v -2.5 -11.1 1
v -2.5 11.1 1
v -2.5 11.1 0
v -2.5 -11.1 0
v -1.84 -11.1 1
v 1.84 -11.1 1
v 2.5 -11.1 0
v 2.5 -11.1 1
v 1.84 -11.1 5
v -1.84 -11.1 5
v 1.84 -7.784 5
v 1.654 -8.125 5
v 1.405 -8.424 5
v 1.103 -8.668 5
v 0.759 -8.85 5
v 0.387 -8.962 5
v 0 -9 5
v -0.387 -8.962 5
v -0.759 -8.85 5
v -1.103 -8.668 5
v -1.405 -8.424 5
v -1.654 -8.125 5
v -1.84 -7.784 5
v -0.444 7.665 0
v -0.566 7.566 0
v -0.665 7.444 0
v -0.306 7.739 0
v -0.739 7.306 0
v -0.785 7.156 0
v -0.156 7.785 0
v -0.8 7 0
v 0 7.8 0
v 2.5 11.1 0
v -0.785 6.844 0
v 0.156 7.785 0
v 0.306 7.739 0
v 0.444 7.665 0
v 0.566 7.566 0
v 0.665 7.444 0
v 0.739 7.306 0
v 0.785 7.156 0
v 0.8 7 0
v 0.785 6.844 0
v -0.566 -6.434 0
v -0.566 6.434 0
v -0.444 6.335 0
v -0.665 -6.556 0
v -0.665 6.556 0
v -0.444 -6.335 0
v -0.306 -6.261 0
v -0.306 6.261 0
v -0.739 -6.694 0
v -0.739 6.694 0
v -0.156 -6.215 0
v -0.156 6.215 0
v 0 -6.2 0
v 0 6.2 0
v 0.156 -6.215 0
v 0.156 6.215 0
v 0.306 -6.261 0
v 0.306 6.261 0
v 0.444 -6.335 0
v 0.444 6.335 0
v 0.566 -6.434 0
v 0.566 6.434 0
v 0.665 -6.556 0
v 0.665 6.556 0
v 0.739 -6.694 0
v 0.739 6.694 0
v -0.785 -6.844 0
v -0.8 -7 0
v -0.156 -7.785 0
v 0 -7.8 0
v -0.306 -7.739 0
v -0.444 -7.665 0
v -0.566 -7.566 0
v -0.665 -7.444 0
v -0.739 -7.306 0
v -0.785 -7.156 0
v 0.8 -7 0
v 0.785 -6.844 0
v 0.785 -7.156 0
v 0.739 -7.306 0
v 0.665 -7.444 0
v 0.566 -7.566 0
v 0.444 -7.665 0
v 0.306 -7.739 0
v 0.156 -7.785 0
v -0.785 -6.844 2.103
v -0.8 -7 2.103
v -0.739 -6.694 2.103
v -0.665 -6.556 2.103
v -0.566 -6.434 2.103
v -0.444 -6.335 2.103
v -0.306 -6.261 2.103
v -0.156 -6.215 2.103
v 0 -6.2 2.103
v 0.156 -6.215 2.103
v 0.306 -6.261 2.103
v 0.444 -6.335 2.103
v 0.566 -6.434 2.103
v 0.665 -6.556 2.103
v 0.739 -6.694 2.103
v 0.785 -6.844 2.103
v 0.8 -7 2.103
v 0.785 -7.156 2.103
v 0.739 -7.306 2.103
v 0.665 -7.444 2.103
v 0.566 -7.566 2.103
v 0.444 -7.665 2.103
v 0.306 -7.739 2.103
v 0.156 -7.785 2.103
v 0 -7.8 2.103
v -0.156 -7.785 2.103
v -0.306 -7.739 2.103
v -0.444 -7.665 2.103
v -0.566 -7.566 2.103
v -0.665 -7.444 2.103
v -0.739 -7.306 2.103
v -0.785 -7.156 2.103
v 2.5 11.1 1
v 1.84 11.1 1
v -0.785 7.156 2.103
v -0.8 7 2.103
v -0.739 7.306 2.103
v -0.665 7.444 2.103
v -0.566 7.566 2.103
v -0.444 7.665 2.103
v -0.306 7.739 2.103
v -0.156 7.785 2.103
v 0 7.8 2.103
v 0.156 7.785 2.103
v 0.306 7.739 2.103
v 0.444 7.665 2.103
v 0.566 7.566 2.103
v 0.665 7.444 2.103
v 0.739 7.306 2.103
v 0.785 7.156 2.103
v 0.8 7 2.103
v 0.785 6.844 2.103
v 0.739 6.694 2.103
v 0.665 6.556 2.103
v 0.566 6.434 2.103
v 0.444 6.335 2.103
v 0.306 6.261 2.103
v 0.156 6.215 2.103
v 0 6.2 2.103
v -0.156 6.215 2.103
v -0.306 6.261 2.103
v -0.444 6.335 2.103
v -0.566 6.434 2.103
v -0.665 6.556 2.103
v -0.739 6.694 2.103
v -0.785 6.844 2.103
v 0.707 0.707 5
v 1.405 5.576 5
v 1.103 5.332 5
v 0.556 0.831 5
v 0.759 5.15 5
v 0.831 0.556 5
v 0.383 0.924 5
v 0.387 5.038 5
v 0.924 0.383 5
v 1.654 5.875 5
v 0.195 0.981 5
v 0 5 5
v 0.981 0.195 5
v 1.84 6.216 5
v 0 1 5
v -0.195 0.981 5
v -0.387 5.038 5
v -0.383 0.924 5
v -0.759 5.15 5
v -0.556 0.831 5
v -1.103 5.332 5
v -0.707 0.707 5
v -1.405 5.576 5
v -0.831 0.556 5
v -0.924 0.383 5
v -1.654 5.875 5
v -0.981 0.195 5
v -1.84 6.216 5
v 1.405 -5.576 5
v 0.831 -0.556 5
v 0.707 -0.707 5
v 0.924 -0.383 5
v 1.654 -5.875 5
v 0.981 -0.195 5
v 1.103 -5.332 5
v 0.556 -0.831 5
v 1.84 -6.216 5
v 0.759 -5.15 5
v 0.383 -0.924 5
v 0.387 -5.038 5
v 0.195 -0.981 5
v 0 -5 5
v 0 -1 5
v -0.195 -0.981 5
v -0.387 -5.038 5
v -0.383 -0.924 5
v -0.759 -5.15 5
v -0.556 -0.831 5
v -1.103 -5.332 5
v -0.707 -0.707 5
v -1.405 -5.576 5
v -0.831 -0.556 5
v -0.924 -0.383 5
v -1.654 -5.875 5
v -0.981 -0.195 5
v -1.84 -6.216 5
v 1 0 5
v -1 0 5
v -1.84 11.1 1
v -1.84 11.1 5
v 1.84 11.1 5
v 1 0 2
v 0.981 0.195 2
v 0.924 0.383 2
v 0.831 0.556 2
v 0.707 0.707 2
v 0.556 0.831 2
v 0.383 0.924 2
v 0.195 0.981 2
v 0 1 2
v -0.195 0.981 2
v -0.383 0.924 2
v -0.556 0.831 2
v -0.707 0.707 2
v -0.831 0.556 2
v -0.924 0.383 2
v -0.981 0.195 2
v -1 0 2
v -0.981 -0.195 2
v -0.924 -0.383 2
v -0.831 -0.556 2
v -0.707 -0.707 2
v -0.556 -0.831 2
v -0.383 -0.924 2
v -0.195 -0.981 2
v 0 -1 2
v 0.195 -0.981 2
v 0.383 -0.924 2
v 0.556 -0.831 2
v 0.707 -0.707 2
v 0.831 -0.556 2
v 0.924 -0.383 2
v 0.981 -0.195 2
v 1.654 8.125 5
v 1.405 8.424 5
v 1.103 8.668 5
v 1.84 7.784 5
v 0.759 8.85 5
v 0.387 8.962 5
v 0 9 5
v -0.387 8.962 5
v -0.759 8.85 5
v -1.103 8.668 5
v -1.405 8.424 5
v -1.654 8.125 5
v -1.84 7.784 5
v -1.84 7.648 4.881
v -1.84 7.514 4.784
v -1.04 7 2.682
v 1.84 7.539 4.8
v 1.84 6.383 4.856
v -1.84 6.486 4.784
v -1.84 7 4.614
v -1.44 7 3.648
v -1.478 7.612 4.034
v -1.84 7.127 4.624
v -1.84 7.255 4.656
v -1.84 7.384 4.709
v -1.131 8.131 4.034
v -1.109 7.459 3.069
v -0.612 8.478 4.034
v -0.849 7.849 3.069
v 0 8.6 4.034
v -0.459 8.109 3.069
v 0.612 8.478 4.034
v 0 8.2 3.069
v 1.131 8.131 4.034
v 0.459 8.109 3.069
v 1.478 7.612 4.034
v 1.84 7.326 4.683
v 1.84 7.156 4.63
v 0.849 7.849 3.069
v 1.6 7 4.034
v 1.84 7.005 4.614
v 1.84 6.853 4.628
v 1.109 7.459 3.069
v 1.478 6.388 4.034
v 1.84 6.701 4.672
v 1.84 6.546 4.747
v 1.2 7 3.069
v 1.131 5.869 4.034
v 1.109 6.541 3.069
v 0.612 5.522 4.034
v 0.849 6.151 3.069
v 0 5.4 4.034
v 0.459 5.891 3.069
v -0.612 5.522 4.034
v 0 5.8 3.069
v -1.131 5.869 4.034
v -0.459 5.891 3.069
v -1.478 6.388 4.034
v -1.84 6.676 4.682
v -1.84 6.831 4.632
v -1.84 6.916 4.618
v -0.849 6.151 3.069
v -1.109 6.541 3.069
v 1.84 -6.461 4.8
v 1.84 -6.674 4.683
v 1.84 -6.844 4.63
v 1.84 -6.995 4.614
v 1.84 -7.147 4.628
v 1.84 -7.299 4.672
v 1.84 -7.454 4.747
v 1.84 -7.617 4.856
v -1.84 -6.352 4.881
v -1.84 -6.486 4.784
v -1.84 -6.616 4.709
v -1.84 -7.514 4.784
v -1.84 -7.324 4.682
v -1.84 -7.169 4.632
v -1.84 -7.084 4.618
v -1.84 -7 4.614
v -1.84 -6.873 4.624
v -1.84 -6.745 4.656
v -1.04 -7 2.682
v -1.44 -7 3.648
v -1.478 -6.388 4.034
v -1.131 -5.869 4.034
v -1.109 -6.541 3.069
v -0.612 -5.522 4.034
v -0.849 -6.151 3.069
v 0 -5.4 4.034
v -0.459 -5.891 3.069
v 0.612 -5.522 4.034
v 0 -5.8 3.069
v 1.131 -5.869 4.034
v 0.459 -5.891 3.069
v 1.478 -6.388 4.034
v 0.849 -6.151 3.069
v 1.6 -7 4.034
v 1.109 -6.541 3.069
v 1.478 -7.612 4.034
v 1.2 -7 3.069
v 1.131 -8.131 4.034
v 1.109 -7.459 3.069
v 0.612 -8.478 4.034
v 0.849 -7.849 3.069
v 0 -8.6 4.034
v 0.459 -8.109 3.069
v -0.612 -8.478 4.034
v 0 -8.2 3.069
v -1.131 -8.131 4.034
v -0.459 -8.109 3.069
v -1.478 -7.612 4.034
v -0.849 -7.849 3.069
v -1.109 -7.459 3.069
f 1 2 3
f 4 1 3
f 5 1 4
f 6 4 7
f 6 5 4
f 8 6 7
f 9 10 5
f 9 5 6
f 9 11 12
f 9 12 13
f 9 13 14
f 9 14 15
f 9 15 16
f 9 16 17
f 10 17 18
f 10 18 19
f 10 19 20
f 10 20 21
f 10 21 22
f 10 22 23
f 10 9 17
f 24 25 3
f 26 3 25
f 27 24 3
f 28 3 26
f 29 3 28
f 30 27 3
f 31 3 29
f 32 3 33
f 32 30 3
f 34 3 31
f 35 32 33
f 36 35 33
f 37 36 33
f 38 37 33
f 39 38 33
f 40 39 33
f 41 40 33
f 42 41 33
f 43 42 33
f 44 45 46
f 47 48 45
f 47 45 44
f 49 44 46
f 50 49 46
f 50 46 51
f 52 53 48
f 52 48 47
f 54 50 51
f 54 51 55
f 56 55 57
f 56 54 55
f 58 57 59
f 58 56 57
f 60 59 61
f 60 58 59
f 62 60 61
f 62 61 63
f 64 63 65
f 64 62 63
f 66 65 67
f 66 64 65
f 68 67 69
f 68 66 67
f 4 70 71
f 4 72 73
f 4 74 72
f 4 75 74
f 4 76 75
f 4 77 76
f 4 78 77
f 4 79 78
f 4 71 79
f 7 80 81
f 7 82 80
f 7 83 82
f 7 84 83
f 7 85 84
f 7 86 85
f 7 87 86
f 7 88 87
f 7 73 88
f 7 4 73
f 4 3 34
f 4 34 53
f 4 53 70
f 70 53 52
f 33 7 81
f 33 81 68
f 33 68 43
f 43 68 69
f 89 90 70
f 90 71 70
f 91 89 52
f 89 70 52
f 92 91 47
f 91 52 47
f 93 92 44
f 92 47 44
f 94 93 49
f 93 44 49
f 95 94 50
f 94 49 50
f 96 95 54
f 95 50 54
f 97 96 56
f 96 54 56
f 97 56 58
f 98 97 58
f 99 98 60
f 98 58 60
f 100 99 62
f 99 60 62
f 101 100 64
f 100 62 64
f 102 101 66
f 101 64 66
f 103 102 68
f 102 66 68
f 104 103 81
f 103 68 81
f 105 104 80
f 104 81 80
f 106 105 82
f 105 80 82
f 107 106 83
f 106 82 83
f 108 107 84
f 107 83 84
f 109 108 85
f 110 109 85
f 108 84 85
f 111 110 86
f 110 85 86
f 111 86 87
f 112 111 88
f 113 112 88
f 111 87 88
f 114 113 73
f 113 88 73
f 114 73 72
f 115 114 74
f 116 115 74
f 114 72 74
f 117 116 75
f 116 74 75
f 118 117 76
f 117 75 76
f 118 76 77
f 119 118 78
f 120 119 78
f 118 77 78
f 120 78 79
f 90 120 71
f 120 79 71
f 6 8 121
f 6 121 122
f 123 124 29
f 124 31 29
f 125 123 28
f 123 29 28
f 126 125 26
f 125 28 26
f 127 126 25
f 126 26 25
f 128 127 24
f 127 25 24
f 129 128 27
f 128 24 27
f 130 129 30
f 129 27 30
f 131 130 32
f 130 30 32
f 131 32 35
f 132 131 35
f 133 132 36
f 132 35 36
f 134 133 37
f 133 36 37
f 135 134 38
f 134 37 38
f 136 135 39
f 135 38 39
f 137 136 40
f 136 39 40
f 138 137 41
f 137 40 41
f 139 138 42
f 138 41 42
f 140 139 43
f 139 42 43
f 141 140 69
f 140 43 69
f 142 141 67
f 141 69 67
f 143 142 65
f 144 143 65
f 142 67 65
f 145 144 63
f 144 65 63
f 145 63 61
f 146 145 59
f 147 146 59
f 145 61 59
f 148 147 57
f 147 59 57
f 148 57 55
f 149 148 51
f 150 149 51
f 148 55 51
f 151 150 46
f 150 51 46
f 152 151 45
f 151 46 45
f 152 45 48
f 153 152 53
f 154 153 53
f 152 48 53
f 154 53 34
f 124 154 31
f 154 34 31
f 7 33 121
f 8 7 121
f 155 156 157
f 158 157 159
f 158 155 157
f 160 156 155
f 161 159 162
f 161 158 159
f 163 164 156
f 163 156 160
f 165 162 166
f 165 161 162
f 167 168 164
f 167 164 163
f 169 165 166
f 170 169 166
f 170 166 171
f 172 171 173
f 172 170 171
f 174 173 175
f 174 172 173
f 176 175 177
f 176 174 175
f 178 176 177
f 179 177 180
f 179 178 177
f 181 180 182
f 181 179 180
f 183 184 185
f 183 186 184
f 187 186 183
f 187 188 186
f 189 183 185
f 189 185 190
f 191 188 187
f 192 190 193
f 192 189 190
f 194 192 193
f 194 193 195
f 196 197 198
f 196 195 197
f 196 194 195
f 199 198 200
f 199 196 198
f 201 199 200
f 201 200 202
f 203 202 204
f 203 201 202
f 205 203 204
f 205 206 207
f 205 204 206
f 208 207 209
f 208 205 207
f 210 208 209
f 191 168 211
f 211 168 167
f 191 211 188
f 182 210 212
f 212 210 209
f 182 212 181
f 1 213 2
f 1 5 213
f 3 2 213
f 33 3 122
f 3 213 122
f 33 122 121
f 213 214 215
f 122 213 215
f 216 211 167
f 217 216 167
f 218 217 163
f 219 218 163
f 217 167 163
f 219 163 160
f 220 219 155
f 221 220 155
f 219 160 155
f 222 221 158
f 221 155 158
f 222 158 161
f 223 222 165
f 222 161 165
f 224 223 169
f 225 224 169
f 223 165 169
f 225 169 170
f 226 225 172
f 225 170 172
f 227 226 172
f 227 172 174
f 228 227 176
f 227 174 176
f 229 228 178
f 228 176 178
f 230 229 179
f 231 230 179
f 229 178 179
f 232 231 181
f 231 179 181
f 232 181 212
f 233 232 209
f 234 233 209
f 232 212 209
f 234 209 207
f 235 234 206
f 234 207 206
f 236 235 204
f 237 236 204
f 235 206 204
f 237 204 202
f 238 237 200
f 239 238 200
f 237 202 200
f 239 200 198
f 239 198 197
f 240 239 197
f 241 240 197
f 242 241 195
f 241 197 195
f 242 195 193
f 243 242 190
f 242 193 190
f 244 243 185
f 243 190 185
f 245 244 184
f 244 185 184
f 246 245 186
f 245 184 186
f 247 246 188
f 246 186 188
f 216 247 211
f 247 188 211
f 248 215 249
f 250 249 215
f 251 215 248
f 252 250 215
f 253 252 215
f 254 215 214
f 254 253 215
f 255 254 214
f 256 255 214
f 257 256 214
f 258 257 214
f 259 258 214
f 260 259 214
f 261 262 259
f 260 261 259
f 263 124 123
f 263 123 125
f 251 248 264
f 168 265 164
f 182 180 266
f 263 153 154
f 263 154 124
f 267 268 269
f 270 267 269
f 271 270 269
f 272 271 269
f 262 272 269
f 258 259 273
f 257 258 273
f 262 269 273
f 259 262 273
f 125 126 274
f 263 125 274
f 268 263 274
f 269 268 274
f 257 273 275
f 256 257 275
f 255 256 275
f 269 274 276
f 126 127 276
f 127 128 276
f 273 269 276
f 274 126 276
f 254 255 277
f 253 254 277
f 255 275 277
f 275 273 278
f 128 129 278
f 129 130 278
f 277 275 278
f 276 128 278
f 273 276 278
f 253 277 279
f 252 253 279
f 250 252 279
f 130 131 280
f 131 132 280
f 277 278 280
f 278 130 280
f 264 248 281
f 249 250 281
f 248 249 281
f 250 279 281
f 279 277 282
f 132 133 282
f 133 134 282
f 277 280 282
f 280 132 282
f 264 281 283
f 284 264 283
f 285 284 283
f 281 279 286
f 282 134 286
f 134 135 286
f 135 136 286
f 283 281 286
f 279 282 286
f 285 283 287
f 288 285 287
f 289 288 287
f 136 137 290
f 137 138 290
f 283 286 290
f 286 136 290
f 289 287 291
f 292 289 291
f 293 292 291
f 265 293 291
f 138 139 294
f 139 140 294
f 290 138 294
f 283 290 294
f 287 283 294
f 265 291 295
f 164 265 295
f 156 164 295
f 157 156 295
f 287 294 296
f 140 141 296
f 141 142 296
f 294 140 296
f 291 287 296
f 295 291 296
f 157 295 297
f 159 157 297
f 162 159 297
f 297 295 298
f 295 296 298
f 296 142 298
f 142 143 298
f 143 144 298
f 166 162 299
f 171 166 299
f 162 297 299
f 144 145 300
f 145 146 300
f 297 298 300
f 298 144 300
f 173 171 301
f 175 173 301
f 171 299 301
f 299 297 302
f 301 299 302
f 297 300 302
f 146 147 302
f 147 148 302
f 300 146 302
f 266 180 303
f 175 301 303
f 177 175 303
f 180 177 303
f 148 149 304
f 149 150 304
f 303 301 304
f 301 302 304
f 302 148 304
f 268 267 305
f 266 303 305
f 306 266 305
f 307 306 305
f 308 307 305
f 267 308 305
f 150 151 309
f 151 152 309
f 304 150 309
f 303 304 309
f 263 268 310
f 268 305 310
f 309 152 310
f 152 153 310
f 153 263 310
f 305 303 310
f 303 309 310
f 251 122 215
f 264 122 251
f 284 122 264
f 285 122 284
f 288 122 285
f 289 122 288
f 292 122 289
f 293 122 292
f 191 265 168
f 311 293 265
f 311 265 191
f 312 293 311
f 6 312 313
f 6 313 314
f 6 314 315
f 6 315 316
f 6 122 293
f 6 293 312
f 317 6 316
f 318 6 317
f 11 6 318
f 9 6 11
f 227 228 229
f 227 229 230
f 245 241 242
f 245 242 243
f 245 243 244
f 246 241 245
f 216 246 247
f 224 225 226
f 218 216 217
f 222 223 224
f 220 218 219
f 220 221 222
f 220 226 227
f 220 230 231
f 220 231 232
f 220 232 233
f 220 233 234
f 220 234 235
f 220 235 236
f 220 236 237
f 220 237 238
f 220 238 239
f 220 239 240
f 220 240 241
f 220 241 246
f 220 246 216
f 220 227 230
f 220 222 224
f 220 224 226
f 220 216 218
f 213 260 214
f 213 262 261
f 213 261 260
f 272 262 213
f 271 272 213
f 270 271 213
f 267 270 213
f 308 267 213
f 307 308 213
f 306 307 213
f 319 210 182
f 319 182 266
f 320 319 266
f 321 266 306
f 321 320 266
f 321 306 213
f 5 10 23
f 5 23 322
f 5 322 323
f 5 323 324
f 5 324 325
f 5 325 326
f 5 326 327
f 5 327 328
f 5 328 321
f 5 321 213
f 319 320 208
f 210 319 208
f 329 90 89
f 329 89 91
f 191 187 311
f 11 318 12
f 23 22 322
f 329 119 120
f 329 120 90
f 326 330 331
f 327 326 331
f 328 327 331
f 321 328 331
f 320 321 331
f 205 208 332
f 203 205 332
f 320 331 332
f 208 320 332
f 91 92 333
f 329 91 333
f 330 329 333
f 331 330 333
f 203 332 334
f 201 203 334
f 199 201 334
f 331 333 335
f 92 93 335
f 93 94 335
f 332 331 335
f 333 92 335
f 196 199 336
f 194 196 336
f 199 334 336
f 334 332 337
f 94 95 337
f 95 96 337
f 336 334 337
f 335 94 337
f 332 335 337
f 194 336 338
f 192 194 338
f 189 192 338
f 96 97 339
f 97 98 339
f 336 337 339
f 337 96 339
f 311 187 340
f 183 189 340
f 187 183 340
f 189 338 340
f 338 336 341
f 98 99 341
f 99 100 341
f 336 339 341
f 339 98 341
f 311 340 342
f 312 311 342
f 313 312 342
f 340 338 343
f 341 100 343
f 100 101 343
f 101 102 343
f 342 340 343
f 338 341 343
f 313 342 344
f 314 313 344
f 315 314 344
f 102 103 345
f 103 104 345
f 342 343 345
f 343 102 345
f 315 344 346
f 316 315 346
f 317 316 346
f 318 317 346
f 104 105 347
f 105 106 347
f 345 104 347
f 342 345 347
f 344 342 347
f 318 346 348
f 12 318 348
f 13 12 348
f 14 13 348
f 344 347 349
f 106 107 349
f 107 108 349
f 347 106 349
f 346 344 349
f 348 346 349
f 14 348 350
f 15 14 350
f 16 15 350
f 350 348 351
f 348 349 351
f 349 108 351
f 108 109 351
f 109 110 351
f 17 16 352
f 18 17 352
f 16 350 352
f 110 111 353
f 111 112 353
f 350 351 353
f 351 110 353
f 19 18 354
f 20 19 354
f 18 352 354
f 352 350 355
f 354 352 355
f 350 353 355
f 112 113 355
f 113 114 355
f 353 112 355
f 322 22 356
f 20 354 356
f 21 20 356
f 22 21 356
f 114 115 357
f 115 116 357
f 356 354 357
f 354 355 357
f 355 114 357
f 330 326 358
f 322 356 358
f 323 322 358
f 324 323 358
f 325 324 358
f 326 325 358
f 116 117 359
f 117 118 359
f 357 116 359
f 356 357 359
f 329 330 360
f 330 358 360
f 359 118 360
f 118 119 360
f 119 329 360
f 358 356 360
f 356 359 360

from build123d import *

# Parameters (mm, degrees)
F1_DEPTH       = 11.1
F4_D           = 1.6
F4_CSINK_D     = 4
F4_CSINK_ANGLE = 45
F5_R           = 1
F6_DEPTH       = 3


with BuildPart() as f1:
    # F0 (on Front) → F1 (new body, symmetric)
    with BuildSketch(Plane.XZ):
        Polygon((-2.5, 1), (-2.5, 0), (2.5, 0), (2.5, 1), (1.84, 1), (1.84, 5), (-1.84, 5), (-1.84, 1), align=None)
    extrude(amount=F1_DEPTH, both=True)

    # F4 (through all)
    with Locations(Plane.XY.offset(5)):
        with Locations((0, 7), (0, -7)):
            CounterSinkHole(F4_D / 2, F4_CSINK_D / 2, counter_sink_angle=F4_CSINK_ANGLE)

    # F5 (on face) → F6 (cut)
    with BuildSketch(Plane.XY.offset(5)):
        Circle(F5_R)
    extrude(amount=-F6_DEPTH, mode=Mode.SUBTRACT)


solid = f1.part
